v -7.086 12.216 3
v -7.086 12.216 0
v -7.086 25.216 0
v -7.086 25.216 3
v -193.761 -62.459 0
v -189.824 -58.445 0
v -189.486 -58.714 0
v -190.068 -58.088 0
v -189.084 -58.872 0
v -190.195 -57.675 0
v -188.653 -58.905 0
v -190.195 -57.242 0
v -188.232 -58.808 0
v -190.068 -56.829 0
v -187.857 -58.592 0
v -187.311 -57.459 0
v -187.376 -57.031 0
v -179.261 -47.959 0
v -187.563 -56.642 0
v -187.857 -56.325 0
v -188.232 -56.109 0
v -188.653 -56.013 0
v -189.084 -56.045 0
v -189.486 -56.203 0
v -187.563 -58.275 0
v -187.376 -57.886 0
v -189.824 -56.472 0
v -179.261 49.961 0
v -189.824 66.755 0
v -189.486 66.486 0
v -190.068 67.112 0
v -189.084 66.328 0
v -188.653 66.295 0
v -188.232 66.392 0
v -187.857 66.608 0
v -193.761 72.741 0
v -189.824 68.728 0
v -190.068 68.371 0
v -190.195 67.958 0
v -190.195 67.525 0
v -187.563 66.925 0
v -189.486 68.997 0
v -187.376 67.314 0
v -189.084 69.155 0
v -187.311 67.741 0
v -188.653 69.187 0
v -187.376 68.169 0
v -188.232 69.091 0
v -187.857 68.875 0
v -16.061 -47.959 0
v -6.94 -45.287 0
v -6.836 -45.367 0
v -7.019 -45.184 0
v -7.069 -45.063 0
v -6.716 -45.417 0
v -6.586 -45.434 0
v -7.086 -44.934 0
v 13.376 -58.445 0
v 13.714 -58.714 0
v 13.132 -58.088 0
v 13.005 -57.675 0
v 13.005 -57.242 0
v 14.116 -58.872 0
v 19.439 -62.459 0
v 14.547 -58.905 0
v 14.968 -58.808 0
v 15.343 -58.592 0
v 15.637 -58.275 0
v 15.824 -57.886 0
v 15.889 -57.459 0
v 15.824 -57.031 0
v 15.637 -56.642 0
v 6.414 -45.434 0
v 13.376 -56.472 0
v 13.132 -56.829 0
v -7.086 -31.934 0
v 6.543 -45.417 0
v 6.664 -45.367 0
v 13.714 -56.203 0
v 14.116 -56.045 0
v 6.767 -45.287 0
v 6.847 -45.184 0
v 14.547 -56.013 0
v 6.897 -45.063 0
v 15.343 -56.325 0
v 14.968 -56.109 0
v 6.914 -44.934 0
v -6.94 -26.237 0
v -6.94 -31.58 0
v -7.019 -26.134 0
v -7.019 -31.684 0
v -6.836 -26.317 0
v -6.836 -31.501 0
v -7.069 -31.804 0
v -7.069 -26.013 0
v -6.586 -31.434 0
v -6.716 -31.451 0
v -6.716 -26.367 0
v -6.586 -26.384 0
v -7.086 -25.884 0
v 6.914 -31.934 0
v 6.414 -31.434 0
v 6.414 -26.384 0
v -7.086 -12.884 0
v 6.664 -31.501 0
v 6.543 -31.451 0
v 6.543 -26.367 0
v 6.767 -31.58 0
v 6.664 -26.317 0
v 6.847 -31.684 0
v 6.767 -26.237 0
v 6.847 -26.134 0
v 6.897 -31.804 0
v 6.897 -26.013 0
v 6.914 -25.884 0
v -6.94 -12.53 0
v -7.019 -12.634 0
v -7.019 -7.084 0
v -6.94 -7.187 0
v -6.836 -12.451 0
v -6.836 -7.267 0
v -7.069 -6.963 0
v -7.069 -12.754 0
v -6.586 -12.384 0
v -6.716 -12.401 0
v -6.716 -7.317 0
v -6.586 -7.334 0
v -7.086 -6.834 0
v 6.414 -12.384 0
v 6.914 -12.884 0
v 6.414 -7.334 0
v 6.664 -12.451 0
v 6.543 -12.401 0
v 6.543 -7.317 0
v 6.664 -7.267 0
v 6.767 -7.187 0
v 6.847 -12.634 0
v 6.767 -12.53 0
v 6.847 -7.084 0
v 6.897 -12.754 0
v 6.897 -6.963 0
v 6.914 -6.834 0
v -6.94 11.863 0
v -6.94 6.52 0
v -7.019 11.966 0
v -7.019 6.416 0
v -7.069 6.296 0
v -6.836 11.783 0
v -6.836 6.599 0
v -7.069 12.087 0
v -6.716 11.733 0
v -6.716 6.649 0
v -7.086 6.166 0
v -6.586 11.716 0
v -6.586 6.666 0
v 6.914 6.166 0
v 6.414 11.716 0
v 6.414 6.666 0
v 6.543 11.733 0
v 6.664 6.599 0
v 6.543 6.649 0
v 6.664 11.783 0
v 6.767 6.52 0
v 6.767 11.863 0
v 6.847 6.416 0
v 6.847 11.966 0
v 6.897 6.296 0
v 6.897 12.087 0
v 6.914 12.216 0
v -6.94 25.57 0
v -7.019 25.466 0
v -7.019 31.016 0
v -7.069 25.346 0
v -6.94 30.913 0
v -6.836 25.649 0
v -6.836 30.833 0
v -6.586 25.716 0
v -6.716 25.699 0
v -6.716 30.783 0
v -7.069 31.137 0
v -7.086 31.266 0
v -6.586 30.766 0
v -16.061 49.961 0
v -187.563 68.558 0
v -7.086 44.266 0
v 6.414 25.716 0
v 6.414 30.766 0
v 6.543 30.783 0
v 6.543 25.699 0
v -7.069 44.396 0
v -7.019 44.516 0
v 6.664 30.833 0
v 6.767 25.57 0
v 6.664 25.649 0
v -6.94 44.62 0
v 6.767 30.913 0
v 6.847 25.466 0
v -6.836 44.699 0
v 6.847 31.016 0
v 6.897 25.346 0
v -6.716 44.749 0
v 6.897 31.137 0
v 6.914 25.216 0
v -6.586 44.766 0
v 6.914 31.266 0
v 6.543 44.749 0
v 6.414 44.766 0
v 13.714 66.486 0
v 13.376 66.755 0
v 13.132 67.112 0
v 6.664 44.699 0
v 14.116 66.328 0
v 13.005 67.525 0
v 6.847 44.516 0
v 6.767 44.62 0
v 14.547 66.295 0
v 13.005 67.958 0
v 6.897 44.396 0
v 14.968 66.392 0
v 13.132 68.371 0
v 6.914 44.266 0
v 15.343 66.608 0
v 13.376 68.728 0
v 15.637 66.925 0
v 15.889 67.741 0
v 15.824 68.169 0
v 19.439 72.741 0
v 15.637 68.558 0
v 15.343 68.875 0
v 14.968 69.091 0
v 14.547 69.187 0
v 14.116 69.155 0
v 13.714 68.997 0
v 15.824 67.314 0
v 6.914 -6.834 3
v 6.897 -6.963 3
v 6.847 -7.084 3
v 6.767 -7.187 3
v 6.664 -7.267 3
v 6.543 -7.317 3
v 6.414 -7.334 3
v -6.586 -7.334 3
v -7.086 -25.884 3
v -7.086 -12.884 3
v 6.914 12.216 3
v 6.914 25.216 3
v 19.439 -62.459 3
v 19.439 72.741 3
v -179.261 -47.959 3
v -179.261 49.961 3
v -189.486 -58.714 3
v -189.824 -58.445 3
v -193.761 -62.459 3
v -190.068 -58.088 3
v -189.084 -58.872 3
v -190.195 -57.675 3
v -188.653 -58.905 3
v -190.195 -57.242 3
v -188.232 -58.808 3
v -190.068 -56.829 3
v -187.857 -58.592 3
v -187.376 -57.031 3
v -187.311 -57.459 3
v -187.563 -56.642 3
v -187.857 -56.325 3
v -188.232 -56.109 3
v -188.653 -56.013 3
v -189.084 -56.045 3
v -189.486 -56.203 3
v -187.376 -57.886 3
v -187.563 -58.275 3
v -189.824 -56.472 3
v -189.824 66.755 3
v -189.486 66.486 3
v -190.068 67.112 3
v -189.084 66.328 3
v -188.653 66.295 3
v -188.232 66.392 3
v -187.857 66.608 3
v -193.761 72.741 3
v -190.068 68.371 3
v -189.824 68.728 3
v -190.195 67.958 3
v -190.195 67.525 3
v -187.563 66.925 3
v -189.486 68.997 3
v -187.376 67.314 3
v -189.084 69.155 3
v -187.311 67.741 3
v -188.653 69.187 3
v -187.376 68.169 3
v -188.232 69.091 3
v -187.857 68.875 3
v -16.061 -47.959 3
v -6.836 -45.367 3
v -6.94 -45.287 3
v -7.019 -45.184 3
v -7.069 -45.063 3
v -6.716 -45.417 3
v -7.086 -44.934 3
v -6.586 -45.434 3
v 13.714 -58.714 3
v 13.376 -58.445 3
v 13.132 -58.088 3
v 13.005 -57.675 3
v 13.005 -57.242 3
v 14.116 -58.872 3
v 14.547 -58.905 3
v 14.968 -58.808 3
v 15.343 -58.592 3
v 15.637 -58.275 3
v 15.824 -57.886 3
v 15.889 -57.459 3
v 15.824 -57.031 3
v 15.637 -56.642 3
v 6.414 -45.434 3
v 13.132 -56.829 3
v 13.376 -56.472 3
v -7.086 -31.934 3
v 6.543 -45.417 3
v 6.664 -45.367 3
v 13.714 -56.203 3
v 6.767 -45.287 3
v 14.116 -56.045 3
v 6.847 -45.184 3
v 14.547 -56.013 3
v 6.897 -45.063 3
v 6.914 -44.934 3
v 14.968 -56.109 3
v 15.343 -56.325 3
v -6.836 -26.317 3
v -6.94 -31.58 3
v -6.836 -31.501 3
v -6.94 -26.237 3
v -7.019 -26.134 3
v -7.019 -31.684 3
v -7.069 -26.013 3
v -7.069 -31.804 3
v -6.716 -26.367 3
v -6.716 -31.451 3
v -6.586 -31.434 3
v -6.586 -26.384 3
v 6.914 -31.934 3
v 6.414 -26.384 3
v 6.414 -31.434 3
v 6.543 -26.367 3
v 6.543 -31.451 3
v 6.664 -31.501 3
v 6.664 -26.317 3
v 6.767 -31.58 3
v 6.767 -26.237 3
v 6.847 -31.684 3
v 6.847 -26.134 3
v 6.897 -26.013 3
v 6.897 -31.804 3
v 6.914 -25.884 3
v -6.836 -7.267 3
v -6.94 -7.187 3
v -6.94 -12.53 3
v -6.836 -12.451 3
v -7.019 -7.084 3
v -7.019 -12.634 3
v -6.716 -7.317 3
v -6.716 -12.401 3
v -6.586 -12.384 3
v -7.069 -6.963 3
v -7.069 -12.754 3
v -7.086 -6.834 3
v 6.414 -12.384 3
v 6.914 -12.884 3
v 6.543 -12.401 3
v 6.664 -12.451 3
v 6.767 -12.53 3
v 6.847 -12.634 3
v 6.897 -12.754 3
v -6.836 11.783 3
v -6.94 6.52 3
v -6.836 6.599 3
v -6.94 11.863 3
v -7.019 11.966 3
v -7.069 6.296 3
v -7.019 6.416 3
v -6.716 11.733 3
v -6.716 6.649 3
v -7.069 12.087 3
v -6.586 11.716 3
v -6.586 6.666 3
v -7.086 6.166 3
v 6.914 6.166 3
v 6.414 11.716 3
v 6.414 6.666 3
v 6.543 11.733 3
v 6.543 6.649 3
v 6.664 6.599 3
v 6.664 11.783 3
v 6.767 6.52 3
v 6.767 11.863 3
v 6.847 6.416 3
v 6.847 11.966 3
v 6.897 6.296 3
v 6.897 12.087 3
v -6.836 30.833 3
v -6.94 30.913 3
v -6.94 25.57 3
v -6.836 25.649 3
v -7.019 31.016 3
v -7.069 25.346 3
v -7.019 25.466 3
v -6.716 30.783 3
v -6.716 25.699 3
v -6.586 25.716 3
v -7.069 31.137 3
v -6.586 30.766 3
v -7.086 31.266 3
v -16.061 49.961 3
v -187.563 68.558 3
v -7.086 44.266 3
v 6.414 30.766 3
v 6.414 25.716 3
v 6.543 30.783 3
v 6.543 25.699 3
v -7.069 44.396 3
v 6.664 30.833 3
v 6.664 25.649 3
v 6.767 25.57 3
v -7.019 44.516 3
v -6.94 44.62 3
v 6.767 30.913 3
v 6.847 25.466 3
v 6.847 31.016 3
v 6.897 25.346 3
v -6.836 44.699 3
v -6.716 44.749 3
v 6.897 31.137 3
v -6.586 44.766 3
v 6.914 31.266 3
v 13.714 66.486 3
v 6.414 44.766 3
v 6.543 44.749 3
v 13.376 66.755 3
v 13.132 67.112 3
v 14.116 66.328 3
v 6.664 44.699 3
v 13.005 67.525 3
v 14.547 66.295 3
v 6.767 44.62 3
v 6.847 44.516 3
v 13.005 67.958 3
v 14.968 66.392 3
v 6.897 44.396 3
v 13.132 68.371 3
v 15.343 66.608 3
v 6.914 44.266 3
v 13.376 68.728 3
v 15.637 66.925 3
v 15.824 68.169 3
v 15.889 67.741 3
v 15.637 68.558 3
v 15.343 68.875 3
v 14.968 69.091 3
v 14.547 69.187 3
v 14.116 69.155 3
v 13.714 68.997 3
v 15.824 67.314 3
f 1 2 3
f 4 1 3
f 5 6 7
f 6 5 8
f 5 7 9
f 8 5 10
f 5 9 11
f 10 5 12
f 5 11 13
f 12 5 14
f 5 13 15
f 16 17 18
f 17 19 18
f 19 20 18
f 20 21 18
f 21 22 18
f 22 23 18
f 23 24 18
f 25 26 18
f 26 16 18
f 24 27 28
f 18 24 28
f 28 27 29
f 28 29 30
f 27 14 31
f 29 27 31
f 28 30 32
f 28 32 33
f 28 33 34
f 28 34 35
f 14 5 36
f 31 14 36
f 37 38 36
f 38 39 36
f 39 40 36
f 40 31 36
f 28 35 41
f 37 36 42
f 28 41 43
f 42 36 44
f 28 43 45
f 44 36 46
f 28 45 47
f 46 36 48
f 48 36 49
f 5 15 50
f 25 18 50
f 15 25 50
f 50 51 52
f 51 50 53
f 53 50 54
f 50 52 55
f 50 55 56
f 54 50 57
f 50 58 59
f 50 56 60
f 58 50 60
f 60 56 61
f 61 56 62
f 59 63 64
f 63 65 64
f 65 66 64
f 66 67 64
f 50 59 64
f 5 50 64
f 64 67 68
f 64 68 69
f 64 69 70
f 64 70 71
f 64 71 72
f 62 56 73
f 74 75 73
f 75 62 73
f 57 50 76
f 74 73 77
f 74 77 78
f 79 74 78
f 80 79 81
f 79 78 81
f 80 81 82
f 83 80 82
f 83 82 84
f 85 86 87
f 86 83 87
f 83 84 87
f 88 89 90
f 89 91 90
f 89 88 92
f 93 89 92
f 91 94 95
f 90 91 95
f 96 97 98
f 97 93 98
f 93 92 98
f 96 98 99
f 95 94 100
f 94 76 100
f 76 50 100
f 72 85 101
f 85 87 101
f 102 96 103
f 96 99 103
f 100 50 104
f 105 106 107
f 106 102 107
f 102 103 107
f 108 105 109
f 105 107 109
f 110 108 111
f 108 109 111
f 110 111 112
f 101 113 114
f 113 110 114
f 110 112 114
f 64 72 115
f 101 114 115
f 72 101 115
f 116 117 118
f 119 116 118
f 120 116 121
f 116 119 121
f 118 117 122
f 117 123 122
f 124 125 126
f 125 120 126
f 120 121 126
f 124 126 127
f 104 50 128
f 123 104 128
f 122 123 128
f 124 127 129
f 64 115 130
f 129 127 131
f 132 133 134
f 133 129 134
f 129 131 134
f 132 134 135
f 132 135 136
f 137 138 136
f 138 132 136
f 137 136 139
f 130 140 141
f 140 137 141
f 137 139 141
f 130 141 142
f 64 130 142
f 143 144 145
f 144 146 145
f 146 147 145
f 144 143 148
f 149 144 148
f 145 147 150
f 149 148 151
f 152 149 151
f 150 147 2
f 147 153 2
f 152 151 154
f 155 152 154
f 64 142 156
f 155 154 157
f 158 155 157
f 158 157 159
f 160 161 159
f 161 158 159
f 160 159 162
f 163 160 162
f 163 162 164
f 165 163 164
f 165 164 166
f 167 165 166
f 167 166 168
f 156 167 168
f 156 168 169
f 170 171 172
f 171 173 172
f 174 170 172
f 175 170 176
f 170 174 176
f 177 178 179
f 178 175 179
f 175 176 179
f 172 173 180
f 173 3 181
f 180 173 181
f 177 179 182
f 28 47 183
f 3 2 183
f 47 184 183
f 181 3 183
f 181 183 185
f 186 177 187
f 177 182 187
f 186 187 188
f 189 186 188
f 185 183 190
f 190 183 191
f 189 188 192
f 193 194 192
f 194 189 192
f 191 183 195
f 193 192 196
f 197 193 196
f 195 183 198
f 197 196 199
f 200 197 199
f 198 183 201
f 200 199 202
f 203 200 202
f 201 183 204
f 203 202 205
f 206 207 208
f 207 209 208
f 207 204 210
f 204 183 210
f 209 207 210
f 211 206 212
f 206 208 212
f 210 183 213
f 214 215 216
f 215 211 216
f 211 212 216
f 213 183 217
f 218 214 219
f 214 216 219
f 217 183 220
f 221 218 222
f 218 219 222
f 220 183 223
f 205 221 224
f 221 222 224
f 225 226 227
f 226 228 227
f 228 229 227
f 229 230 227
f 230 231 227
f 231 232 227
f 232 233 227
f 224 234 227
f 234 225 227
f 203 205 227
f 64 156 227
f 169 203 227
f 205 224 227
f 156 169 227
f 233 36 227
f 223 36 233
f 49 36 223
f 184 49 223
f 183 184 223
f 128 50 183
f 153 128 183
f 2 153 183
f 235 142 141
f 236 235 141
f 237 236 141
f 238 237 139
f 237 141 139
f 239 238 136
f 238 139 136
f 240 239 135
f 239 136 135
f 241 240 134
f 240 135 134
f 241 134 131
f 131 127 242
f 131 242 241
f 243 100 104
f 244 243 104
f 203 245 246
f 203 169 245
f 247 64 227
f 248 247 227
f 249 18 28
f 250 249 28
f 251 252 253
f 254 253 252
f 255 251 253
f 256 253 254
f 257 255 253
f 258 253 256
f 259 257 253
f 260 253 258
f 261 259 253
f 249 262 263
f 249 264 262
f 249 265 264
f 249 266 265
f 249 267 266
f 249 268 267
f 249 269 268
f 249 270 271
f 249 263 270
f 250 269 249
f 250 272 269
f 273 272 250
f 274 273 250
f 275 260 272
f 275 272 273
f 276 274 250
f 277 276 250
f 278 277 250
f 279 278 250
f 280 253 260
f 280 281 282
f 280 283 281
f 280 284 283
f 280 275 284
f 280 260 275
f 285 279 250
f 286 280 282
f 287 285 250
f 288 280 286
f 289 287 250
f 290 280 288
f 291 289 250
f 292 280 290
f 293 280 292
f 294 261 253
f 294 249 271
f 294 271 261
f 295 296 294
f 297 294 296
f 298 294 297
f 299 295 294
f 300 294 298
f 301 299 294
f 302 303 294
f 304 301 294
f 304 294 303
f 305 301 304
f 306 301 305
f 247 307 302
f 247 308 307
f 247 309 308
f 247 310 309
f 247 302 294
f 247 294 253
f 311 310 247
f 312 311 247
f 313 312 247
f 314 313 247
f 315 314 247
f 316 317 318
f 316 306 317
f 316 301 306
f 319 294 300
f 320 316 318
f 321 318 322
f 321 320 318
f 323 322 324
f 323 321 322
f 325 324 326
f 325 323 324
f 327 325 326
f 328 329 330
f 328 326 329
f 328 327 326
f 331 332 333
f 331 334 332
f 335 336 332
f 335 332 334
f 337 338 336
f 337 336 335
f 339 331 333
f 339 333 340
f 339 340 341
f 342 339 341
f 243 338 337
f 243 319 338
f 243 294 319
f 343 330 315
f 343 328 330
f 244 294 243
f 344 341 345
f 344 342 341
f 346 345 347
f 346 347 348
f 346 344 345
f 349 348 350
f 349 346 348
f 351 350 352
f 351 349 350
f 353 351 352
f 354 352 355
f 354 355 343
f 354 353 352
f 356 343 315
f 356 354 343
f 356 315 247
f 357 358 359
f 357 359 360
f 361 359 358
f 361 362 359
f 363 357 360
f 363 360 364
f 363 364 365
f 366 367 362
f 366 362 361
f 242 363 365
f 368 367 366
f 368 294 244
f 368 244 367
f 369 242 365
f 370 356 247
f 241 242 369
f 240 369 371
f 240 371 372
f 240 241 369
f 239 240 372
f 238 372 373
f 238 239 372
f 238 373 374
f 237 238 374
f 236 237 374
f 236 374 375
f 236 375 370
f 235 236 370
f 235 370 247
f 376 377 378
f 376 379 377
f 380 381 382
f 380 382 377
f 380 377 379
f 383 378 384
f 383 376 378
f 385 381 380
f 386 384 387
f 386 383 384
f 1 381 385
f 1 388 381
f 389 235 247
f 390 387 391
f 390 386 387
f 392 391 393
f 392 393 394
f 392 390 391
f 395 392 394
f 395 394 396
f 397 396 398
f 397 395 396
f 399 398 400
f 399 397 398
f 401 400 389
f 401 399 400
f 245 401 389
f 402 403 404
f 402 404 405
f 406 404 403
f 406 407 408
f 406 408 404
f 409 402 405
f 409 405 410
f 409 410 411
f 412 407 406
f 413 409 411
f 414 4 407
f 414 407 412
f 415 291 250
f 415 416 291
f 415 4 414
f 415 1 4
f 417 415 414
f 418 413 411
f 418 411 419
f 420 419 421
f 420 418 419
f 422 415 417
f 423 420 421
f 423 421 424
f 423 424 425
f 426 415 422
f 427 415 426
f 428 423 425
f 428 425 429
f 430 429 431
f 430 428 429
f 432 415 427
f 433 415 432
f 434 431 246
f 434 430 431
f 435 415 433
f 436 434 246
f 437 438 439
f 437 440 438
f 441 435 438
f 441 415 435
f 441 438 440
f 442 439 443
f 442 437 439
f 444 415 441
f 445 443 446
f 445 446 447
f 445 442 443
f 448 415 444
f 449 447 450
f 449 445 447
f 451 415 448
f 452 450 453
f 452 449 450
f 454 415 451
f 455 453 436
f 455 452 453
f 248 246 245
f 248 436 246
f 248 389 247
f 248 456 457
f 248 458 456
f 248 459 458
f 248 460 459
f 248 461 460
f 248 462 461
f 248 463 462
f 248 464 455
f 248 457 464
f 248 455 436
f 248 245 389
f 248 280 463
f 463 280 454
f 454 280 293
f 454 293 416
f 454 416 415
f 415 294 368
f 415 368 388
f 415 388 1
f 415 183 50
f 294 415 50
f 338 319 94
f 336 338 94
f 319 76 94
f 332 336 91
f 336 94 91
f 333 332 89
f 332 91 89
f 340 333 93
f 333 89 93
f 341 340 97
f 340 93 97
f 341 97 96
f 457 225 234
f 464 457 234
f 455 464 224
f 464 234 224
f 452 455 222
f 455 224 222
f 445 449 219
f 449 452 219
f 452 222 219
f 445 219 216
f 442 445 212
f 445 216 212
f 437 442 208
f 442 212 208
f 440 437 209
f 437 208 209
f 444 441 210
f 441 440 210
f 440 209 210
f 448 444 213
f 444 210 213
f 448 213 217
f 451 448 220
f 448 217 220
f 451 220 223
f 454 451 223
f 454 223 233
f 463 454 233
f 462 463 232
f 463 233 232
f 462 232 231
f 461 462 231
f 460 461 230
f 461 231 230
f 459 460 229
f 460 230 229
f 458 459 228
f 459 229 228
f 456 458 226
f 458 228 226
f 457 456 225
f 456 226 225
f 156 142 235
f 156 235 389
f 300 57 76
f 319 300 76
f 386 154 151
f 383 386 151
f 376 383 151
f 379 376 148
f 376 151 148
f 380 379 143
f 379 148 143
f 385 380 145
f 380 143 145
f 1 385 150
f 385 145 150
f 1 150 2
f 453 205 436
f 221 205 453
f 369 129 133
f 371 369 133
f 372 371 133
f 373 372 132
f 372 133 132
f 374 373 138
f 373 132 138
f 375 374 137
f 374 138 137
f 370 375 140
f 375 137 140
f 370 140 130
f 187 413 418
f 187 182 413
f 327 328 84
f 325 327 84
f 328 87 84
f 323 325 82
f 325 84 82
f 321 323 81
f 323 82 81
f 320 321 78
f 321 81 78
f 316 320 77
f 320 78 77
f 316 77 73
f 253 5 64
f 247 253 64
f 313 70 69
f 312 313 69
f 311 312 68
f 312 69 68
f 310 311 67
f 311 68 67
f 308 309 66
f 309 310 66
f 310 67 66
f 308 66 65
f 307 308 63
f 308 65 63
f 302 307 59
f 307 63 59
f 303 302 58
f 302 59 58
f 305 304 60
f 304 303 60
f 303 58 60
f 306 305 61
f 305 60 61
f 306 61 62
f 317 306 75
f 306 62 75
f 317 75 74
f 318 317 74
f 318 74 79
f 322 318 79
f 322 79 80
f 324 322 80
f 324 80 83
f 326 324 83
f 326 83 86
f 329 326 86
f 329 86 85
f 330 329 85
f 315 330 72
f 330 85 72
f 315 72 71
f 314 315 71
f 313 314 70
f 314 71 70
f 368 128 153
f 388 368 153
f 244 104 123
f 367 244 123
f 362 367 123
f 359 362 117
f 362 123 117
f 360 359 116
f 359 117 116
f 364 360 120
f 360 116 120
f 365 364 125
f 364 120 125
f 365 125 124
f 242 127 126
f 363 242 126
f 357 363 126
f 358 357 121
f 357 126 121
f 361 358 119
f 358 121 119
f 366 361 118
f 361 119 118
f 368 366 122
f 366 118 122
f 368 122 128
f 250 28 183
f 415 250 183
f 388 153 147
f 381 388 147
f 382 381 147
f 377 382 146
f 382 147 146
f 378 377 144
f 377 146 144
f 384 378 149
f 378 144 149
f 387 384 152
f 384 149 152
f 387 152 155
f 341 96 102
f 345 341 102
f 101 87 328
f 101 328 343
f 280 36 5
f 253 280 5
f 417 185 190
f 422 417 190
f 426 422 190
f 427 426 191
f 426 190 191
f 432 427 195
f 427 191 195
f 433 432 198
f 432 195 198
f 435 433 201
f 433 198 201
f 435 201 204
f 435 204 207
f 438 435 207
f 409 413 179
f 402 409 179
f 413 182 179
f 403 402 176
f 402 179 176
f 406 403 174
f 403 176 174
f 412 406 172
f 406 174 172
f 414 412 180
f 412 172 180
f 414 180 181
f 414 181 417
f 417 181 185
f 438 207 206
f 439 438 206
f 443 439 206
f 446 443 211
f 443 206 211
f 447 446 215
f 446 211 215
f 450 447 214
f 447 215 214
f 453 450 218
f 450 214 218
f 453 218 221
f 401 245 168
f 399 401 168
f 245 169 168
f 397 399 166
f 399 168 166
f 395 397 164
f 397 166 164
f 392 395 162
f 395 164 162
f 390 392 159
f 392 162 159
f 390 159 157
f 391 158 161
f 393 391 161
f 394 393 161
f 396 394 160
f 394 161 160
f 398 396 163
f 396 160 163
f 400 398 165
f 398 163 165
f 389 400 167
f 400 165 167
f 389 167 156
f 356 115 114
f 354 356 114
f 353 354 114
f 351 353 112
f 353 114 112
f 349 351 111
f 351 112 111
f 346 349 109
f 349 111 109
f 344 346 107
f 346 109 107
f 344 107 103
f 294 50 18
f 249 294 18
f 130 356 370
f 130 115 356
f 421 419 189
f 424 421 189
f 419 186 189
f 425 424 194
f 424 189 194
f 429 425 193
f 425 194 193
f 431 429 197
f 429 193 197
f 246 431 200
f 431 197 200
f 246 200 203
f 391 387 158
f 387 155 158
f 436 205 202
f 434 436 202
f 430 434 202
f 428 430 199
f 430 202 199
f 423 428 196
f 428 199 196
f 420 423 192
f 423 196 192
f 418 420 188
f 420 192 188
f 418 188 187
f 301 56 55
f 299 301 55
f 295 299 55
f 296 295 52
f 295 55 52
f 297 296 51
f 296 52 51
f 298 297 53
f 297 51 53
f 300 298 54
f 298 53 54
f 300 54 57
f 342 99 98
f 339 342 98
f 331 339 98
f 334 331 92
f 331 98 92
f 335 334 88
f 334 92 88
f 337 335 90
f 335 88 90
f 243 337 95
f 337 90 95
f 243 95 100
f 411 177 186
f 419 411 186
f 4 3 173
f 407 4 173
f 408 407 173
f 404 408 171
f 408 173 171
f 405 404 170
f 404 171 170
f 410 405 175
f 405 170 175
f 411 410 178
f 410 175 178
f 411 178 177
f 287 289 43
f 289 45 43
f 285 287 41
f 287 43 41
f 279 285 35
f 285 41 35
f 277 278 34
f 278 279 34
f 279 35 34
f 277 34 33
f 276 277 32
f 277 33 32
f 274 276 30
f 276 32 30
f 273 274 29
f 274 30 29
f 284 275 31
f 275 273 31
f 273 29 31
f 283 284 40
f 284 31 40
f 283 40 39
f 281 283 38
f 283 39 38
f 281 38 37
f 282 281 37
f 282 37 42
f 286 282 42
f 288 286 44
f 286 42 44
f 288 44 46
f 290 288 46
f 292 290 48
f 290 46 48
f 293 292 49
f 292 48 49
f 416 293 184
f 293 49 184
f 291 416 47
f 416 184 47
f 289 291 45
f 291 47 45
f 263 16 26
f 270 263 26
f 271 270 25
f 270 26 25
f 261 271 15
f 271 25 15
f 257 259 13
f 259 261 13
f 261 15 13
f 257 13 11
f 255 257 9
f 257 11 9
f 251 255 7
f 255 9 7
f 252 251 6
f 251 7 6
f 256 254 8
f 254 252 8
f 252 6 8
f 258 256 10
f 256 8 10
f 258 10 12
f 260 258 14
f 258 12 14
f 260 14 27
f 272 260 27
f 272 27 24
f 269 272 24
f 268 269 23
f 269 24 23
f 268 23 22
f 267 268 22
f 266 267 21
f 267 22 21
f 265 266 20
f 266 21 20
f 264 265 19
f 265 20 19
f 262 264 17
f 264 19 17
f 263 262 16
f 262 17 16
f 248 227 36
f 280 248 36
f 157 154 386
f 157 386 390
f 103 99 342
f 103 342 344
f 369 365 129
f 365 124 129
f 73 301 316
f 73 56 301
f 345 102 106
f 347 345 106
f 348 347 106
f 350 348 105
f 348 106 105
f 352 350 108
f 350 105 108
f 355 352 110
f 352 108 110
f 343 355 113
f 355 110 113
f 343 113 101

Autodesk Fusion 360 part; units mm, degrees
sketch "plate-2026-03-03T15_18_35.082Z" plane through (0, 0, 0) normal (0, 0, 1) x (1, 0, 0)
  line L0 (-7.0864, -44.9336) -> (-7.0864, -31.9336)
  line L1 (6.9136, -44.9336) -> (6.9136, -31.9336)
  line L2 (-6.5864, -45.4336) -> (6.4136, -45.4336)
  line L3 (-6.5864, -31.4336) -> (6.4136, -31.4336)
  arc A0 (-7.0864, -44.9336) -> (-6.5864, -45.4336) centre (-6.5864, -44.9336) ccw
  arc A1 (-6.5864, -31.4336) -> (-7.0864, -31.9336) centre (-6.5864, -31.9336) ccw
  arc A2 (6.4136, -45.4336) -> (6.9136, -44.9336) centre (6.4136, -44.9336) ccw
  arc A3 (6.9136, -31.9336) -> (6.4136, -31.4336) centre (6.4136, -31.9336) ccw
  line L4 (-7.0864, -25.8836) -> (-7.0864, -12.8836)
  line L5 (6.9136, -25.8836) -> (6.9136, -12.8836)
  line L6 (-6.5864, -26.3836) -> (6.4136, -26.3836)
  line L7 (-6.5864, -12.3836) -> (6.4136, -12.3836)
  arc A4 (-7.0864, -25.8836) -> (-6.5864, -26.3836) centre (-6.5864, -25.8836) ccw
  arc A5 (-6.5864, -12.3836) -> (-7.0864, -12.8836) centre (-6.5864, -12.8836) ccw
  arc A6 (6.4136, -26.3836) -> (6.9136, -25.8836) centre (6.4136, -25.8836) ccw
  arc A7 (6.9136, -12.8836) -> (6.4136, -12.3836) centre (6.4136, -12.8836) ccw
  line L8 (-7.0864, -6.8336) -> (-7.0864, 6.1664)
  line L9 (6.9136, -6.8336) -> (6.9136, 6.1664)
  line L10 (-6.5864, -7.3336) -> (6.4136, -7.3336)
  line L11 (-6.5864, 6.6664) -> (6.4136, 6.6664)
  arc A8 (-7.0864, -6.8336) -> (-6.5864, -7.3336) centre (-6.5864, -6.8336) ccw
  arc A9 (-6.5864, 6.6664) -> (-7.0864, 6.1664) centre (-6.5864, 6.1664) ccw
  arc A10 (6.4136, -7.3336) -> (6.9136, -6.8336) centre (6.4136, -6.8336) ccw
  arc A11 (6.9136, 6.1664) -> (6.4136, 6.6664) centre (6.4136, 6.1664) ccw
  line L12 (-7.0864, 12.2164) -> (-7.0864, 25.2164)
  line L13 (6.9136, 12.2164) -> (6.9136, 25.2164)
  line L14 (-6.5864, 11.7164) -> (6.4136, 11.7164)
  line L15 (-6.5864, 25.7164) -> (6.4136, 25.7164)
  arc A12 (-7.0864, 12.2164) -> (-6.5864, 11.7164) centre (-6.5864, 12.2164) ccw
  arc A13 (-6.5864, 25.7164) -> (-7.0864, 25.2164) centre (-6.5864, 25.2164) ccw
  arc A14 (6.4136, 11.7164) -> (6.9136, 12.2164) centre (6.4136, 12.2164) ccw
  arc A15 (6.9136, 25.2164) -> (6.4136, 25.7164) centre (6.4136, 25.2164) ccw
  line L16 (-7.0864, 31.2664) -> (-7.0864, 44.2664)
  line L17 (6.9136, 31.2664) -> (6.9136, 44.2664)
  line L18 (-6.5864, 30.7664) -> (6.4136, 30.7664)
  line L19 (-6.5864, 44.7664) -> (6.4136, 44.7664)
  arc A16 (-7.0864, 31.2664) -> (-6.5864, 30.7664) centre (-6.5864, 31.2664) ccw
  arc A17 (-6.5864, 44.7664) -> (-7.0864, 44.2664) centre (-6.5864, 44.2664) ccw
  arc A18 (6.4136, 30.7664) -> (6.9136, 31.2664) centre (6.4136, 31.2664) ccw
  arc A19 (6.9136, 44.2664) -> (6.4136, 44.7664) centre (6.4136, 44.2664) ccw
  line L20 (9.4386, -47.9586) -> (9.4386, 47.2914)
  line L21 (-9.6114, -47.9586) -> (-9.6114, 47.2914)
  line L22 (9.4386, -47.9586) -> (-9.6114, -47.9586)
  line L23 (9.4386, 47.2914) -> (-9.6114, 47.2914)
sketch "Sketch2" plane through (0, 0, 0) normal (0, 0, 1) x (1, 0, 0)
  line L0 (19.4386, 72.7414) -> (-193.7614, 72.7414)
  line L1 (-193.7614, 72.7414) -> (-193.7614, -62.4586)
  line L2 (-193.7614, -62.4586) -> (19.4386, -62.4586)
  line L3 (19.4386, -62.4586) -> (19.4386, 72.7414)
  line L4 (9.4386, -47.9586) -> (9.4386, 47.2914)
  line L5 (9.4386, -47.9586) -> (-9.6114, -47.9586)
  circle A0 centre (14.4386, 67.7414) radius 1.45
  circle A1 centre (-188.7614, 67.7414) radius 1.45
  circle A2 centre (-188.7614, -57.4586) radius 1.45
  circle A3 centre (14.4386, -57.4586) radius 1.45
  line L6 (-179.2614, 49.9614) -> (-16.0614, 49.9614)
  line L7 (-16.0614, 49.9614) -> (-16.0614, -47.9586)
  line L8 (-16.0614, -47.9586) -> (-179.2614, -47.9586)
  line L9 (-179.2614, -47.9586) -> (-179.2614, 49.9614)
  dimension "d1" = 213.2
  dimension "d2" = 135.2
  dimension "d3" = 10
  dimension "d5" = 2.9
  dimension "d6" = 2.9
  dimension "d7" = 2.9
  dimension "d8" = 2.9
  dimension "d9" = 5
  dimension "d10" = 5
  dimension "d11" = 5
  dimension "d12" = 5
  dimension "d13" = 5
  dimension "d14" = 5
  dimension "d15" = 5
  dimension "d16" = 5
  dimension "d17" = 163.2
  dimension "d18" = 97.92
  dimension "d20" = 14.5
  dimension "d22" = 14.5
  dimension "d23" = 14.5
extrude "Extrude1" add sketch "Sketch2" along normal blind 3
extrude "Extrude2" cut sketch "plate-2026-03-03T15_18_35.082Z" along normal blind 15 contours L0 L1 L2 L3 A0 A1 A2 A3 | L4 L5 L6 L7 A4 A5 A6 A7 | L8 L9 L10 L11 A8 A9 A10 A11 | L12 L13 L14 L15 A12 A13 A14 A15 | L16 L17 L18 L19 A16 A17 A18 A19
equation "d1 = 193.2 mm + 20 mm"
equation "d2 = 115.2 mm + 20 mm"
